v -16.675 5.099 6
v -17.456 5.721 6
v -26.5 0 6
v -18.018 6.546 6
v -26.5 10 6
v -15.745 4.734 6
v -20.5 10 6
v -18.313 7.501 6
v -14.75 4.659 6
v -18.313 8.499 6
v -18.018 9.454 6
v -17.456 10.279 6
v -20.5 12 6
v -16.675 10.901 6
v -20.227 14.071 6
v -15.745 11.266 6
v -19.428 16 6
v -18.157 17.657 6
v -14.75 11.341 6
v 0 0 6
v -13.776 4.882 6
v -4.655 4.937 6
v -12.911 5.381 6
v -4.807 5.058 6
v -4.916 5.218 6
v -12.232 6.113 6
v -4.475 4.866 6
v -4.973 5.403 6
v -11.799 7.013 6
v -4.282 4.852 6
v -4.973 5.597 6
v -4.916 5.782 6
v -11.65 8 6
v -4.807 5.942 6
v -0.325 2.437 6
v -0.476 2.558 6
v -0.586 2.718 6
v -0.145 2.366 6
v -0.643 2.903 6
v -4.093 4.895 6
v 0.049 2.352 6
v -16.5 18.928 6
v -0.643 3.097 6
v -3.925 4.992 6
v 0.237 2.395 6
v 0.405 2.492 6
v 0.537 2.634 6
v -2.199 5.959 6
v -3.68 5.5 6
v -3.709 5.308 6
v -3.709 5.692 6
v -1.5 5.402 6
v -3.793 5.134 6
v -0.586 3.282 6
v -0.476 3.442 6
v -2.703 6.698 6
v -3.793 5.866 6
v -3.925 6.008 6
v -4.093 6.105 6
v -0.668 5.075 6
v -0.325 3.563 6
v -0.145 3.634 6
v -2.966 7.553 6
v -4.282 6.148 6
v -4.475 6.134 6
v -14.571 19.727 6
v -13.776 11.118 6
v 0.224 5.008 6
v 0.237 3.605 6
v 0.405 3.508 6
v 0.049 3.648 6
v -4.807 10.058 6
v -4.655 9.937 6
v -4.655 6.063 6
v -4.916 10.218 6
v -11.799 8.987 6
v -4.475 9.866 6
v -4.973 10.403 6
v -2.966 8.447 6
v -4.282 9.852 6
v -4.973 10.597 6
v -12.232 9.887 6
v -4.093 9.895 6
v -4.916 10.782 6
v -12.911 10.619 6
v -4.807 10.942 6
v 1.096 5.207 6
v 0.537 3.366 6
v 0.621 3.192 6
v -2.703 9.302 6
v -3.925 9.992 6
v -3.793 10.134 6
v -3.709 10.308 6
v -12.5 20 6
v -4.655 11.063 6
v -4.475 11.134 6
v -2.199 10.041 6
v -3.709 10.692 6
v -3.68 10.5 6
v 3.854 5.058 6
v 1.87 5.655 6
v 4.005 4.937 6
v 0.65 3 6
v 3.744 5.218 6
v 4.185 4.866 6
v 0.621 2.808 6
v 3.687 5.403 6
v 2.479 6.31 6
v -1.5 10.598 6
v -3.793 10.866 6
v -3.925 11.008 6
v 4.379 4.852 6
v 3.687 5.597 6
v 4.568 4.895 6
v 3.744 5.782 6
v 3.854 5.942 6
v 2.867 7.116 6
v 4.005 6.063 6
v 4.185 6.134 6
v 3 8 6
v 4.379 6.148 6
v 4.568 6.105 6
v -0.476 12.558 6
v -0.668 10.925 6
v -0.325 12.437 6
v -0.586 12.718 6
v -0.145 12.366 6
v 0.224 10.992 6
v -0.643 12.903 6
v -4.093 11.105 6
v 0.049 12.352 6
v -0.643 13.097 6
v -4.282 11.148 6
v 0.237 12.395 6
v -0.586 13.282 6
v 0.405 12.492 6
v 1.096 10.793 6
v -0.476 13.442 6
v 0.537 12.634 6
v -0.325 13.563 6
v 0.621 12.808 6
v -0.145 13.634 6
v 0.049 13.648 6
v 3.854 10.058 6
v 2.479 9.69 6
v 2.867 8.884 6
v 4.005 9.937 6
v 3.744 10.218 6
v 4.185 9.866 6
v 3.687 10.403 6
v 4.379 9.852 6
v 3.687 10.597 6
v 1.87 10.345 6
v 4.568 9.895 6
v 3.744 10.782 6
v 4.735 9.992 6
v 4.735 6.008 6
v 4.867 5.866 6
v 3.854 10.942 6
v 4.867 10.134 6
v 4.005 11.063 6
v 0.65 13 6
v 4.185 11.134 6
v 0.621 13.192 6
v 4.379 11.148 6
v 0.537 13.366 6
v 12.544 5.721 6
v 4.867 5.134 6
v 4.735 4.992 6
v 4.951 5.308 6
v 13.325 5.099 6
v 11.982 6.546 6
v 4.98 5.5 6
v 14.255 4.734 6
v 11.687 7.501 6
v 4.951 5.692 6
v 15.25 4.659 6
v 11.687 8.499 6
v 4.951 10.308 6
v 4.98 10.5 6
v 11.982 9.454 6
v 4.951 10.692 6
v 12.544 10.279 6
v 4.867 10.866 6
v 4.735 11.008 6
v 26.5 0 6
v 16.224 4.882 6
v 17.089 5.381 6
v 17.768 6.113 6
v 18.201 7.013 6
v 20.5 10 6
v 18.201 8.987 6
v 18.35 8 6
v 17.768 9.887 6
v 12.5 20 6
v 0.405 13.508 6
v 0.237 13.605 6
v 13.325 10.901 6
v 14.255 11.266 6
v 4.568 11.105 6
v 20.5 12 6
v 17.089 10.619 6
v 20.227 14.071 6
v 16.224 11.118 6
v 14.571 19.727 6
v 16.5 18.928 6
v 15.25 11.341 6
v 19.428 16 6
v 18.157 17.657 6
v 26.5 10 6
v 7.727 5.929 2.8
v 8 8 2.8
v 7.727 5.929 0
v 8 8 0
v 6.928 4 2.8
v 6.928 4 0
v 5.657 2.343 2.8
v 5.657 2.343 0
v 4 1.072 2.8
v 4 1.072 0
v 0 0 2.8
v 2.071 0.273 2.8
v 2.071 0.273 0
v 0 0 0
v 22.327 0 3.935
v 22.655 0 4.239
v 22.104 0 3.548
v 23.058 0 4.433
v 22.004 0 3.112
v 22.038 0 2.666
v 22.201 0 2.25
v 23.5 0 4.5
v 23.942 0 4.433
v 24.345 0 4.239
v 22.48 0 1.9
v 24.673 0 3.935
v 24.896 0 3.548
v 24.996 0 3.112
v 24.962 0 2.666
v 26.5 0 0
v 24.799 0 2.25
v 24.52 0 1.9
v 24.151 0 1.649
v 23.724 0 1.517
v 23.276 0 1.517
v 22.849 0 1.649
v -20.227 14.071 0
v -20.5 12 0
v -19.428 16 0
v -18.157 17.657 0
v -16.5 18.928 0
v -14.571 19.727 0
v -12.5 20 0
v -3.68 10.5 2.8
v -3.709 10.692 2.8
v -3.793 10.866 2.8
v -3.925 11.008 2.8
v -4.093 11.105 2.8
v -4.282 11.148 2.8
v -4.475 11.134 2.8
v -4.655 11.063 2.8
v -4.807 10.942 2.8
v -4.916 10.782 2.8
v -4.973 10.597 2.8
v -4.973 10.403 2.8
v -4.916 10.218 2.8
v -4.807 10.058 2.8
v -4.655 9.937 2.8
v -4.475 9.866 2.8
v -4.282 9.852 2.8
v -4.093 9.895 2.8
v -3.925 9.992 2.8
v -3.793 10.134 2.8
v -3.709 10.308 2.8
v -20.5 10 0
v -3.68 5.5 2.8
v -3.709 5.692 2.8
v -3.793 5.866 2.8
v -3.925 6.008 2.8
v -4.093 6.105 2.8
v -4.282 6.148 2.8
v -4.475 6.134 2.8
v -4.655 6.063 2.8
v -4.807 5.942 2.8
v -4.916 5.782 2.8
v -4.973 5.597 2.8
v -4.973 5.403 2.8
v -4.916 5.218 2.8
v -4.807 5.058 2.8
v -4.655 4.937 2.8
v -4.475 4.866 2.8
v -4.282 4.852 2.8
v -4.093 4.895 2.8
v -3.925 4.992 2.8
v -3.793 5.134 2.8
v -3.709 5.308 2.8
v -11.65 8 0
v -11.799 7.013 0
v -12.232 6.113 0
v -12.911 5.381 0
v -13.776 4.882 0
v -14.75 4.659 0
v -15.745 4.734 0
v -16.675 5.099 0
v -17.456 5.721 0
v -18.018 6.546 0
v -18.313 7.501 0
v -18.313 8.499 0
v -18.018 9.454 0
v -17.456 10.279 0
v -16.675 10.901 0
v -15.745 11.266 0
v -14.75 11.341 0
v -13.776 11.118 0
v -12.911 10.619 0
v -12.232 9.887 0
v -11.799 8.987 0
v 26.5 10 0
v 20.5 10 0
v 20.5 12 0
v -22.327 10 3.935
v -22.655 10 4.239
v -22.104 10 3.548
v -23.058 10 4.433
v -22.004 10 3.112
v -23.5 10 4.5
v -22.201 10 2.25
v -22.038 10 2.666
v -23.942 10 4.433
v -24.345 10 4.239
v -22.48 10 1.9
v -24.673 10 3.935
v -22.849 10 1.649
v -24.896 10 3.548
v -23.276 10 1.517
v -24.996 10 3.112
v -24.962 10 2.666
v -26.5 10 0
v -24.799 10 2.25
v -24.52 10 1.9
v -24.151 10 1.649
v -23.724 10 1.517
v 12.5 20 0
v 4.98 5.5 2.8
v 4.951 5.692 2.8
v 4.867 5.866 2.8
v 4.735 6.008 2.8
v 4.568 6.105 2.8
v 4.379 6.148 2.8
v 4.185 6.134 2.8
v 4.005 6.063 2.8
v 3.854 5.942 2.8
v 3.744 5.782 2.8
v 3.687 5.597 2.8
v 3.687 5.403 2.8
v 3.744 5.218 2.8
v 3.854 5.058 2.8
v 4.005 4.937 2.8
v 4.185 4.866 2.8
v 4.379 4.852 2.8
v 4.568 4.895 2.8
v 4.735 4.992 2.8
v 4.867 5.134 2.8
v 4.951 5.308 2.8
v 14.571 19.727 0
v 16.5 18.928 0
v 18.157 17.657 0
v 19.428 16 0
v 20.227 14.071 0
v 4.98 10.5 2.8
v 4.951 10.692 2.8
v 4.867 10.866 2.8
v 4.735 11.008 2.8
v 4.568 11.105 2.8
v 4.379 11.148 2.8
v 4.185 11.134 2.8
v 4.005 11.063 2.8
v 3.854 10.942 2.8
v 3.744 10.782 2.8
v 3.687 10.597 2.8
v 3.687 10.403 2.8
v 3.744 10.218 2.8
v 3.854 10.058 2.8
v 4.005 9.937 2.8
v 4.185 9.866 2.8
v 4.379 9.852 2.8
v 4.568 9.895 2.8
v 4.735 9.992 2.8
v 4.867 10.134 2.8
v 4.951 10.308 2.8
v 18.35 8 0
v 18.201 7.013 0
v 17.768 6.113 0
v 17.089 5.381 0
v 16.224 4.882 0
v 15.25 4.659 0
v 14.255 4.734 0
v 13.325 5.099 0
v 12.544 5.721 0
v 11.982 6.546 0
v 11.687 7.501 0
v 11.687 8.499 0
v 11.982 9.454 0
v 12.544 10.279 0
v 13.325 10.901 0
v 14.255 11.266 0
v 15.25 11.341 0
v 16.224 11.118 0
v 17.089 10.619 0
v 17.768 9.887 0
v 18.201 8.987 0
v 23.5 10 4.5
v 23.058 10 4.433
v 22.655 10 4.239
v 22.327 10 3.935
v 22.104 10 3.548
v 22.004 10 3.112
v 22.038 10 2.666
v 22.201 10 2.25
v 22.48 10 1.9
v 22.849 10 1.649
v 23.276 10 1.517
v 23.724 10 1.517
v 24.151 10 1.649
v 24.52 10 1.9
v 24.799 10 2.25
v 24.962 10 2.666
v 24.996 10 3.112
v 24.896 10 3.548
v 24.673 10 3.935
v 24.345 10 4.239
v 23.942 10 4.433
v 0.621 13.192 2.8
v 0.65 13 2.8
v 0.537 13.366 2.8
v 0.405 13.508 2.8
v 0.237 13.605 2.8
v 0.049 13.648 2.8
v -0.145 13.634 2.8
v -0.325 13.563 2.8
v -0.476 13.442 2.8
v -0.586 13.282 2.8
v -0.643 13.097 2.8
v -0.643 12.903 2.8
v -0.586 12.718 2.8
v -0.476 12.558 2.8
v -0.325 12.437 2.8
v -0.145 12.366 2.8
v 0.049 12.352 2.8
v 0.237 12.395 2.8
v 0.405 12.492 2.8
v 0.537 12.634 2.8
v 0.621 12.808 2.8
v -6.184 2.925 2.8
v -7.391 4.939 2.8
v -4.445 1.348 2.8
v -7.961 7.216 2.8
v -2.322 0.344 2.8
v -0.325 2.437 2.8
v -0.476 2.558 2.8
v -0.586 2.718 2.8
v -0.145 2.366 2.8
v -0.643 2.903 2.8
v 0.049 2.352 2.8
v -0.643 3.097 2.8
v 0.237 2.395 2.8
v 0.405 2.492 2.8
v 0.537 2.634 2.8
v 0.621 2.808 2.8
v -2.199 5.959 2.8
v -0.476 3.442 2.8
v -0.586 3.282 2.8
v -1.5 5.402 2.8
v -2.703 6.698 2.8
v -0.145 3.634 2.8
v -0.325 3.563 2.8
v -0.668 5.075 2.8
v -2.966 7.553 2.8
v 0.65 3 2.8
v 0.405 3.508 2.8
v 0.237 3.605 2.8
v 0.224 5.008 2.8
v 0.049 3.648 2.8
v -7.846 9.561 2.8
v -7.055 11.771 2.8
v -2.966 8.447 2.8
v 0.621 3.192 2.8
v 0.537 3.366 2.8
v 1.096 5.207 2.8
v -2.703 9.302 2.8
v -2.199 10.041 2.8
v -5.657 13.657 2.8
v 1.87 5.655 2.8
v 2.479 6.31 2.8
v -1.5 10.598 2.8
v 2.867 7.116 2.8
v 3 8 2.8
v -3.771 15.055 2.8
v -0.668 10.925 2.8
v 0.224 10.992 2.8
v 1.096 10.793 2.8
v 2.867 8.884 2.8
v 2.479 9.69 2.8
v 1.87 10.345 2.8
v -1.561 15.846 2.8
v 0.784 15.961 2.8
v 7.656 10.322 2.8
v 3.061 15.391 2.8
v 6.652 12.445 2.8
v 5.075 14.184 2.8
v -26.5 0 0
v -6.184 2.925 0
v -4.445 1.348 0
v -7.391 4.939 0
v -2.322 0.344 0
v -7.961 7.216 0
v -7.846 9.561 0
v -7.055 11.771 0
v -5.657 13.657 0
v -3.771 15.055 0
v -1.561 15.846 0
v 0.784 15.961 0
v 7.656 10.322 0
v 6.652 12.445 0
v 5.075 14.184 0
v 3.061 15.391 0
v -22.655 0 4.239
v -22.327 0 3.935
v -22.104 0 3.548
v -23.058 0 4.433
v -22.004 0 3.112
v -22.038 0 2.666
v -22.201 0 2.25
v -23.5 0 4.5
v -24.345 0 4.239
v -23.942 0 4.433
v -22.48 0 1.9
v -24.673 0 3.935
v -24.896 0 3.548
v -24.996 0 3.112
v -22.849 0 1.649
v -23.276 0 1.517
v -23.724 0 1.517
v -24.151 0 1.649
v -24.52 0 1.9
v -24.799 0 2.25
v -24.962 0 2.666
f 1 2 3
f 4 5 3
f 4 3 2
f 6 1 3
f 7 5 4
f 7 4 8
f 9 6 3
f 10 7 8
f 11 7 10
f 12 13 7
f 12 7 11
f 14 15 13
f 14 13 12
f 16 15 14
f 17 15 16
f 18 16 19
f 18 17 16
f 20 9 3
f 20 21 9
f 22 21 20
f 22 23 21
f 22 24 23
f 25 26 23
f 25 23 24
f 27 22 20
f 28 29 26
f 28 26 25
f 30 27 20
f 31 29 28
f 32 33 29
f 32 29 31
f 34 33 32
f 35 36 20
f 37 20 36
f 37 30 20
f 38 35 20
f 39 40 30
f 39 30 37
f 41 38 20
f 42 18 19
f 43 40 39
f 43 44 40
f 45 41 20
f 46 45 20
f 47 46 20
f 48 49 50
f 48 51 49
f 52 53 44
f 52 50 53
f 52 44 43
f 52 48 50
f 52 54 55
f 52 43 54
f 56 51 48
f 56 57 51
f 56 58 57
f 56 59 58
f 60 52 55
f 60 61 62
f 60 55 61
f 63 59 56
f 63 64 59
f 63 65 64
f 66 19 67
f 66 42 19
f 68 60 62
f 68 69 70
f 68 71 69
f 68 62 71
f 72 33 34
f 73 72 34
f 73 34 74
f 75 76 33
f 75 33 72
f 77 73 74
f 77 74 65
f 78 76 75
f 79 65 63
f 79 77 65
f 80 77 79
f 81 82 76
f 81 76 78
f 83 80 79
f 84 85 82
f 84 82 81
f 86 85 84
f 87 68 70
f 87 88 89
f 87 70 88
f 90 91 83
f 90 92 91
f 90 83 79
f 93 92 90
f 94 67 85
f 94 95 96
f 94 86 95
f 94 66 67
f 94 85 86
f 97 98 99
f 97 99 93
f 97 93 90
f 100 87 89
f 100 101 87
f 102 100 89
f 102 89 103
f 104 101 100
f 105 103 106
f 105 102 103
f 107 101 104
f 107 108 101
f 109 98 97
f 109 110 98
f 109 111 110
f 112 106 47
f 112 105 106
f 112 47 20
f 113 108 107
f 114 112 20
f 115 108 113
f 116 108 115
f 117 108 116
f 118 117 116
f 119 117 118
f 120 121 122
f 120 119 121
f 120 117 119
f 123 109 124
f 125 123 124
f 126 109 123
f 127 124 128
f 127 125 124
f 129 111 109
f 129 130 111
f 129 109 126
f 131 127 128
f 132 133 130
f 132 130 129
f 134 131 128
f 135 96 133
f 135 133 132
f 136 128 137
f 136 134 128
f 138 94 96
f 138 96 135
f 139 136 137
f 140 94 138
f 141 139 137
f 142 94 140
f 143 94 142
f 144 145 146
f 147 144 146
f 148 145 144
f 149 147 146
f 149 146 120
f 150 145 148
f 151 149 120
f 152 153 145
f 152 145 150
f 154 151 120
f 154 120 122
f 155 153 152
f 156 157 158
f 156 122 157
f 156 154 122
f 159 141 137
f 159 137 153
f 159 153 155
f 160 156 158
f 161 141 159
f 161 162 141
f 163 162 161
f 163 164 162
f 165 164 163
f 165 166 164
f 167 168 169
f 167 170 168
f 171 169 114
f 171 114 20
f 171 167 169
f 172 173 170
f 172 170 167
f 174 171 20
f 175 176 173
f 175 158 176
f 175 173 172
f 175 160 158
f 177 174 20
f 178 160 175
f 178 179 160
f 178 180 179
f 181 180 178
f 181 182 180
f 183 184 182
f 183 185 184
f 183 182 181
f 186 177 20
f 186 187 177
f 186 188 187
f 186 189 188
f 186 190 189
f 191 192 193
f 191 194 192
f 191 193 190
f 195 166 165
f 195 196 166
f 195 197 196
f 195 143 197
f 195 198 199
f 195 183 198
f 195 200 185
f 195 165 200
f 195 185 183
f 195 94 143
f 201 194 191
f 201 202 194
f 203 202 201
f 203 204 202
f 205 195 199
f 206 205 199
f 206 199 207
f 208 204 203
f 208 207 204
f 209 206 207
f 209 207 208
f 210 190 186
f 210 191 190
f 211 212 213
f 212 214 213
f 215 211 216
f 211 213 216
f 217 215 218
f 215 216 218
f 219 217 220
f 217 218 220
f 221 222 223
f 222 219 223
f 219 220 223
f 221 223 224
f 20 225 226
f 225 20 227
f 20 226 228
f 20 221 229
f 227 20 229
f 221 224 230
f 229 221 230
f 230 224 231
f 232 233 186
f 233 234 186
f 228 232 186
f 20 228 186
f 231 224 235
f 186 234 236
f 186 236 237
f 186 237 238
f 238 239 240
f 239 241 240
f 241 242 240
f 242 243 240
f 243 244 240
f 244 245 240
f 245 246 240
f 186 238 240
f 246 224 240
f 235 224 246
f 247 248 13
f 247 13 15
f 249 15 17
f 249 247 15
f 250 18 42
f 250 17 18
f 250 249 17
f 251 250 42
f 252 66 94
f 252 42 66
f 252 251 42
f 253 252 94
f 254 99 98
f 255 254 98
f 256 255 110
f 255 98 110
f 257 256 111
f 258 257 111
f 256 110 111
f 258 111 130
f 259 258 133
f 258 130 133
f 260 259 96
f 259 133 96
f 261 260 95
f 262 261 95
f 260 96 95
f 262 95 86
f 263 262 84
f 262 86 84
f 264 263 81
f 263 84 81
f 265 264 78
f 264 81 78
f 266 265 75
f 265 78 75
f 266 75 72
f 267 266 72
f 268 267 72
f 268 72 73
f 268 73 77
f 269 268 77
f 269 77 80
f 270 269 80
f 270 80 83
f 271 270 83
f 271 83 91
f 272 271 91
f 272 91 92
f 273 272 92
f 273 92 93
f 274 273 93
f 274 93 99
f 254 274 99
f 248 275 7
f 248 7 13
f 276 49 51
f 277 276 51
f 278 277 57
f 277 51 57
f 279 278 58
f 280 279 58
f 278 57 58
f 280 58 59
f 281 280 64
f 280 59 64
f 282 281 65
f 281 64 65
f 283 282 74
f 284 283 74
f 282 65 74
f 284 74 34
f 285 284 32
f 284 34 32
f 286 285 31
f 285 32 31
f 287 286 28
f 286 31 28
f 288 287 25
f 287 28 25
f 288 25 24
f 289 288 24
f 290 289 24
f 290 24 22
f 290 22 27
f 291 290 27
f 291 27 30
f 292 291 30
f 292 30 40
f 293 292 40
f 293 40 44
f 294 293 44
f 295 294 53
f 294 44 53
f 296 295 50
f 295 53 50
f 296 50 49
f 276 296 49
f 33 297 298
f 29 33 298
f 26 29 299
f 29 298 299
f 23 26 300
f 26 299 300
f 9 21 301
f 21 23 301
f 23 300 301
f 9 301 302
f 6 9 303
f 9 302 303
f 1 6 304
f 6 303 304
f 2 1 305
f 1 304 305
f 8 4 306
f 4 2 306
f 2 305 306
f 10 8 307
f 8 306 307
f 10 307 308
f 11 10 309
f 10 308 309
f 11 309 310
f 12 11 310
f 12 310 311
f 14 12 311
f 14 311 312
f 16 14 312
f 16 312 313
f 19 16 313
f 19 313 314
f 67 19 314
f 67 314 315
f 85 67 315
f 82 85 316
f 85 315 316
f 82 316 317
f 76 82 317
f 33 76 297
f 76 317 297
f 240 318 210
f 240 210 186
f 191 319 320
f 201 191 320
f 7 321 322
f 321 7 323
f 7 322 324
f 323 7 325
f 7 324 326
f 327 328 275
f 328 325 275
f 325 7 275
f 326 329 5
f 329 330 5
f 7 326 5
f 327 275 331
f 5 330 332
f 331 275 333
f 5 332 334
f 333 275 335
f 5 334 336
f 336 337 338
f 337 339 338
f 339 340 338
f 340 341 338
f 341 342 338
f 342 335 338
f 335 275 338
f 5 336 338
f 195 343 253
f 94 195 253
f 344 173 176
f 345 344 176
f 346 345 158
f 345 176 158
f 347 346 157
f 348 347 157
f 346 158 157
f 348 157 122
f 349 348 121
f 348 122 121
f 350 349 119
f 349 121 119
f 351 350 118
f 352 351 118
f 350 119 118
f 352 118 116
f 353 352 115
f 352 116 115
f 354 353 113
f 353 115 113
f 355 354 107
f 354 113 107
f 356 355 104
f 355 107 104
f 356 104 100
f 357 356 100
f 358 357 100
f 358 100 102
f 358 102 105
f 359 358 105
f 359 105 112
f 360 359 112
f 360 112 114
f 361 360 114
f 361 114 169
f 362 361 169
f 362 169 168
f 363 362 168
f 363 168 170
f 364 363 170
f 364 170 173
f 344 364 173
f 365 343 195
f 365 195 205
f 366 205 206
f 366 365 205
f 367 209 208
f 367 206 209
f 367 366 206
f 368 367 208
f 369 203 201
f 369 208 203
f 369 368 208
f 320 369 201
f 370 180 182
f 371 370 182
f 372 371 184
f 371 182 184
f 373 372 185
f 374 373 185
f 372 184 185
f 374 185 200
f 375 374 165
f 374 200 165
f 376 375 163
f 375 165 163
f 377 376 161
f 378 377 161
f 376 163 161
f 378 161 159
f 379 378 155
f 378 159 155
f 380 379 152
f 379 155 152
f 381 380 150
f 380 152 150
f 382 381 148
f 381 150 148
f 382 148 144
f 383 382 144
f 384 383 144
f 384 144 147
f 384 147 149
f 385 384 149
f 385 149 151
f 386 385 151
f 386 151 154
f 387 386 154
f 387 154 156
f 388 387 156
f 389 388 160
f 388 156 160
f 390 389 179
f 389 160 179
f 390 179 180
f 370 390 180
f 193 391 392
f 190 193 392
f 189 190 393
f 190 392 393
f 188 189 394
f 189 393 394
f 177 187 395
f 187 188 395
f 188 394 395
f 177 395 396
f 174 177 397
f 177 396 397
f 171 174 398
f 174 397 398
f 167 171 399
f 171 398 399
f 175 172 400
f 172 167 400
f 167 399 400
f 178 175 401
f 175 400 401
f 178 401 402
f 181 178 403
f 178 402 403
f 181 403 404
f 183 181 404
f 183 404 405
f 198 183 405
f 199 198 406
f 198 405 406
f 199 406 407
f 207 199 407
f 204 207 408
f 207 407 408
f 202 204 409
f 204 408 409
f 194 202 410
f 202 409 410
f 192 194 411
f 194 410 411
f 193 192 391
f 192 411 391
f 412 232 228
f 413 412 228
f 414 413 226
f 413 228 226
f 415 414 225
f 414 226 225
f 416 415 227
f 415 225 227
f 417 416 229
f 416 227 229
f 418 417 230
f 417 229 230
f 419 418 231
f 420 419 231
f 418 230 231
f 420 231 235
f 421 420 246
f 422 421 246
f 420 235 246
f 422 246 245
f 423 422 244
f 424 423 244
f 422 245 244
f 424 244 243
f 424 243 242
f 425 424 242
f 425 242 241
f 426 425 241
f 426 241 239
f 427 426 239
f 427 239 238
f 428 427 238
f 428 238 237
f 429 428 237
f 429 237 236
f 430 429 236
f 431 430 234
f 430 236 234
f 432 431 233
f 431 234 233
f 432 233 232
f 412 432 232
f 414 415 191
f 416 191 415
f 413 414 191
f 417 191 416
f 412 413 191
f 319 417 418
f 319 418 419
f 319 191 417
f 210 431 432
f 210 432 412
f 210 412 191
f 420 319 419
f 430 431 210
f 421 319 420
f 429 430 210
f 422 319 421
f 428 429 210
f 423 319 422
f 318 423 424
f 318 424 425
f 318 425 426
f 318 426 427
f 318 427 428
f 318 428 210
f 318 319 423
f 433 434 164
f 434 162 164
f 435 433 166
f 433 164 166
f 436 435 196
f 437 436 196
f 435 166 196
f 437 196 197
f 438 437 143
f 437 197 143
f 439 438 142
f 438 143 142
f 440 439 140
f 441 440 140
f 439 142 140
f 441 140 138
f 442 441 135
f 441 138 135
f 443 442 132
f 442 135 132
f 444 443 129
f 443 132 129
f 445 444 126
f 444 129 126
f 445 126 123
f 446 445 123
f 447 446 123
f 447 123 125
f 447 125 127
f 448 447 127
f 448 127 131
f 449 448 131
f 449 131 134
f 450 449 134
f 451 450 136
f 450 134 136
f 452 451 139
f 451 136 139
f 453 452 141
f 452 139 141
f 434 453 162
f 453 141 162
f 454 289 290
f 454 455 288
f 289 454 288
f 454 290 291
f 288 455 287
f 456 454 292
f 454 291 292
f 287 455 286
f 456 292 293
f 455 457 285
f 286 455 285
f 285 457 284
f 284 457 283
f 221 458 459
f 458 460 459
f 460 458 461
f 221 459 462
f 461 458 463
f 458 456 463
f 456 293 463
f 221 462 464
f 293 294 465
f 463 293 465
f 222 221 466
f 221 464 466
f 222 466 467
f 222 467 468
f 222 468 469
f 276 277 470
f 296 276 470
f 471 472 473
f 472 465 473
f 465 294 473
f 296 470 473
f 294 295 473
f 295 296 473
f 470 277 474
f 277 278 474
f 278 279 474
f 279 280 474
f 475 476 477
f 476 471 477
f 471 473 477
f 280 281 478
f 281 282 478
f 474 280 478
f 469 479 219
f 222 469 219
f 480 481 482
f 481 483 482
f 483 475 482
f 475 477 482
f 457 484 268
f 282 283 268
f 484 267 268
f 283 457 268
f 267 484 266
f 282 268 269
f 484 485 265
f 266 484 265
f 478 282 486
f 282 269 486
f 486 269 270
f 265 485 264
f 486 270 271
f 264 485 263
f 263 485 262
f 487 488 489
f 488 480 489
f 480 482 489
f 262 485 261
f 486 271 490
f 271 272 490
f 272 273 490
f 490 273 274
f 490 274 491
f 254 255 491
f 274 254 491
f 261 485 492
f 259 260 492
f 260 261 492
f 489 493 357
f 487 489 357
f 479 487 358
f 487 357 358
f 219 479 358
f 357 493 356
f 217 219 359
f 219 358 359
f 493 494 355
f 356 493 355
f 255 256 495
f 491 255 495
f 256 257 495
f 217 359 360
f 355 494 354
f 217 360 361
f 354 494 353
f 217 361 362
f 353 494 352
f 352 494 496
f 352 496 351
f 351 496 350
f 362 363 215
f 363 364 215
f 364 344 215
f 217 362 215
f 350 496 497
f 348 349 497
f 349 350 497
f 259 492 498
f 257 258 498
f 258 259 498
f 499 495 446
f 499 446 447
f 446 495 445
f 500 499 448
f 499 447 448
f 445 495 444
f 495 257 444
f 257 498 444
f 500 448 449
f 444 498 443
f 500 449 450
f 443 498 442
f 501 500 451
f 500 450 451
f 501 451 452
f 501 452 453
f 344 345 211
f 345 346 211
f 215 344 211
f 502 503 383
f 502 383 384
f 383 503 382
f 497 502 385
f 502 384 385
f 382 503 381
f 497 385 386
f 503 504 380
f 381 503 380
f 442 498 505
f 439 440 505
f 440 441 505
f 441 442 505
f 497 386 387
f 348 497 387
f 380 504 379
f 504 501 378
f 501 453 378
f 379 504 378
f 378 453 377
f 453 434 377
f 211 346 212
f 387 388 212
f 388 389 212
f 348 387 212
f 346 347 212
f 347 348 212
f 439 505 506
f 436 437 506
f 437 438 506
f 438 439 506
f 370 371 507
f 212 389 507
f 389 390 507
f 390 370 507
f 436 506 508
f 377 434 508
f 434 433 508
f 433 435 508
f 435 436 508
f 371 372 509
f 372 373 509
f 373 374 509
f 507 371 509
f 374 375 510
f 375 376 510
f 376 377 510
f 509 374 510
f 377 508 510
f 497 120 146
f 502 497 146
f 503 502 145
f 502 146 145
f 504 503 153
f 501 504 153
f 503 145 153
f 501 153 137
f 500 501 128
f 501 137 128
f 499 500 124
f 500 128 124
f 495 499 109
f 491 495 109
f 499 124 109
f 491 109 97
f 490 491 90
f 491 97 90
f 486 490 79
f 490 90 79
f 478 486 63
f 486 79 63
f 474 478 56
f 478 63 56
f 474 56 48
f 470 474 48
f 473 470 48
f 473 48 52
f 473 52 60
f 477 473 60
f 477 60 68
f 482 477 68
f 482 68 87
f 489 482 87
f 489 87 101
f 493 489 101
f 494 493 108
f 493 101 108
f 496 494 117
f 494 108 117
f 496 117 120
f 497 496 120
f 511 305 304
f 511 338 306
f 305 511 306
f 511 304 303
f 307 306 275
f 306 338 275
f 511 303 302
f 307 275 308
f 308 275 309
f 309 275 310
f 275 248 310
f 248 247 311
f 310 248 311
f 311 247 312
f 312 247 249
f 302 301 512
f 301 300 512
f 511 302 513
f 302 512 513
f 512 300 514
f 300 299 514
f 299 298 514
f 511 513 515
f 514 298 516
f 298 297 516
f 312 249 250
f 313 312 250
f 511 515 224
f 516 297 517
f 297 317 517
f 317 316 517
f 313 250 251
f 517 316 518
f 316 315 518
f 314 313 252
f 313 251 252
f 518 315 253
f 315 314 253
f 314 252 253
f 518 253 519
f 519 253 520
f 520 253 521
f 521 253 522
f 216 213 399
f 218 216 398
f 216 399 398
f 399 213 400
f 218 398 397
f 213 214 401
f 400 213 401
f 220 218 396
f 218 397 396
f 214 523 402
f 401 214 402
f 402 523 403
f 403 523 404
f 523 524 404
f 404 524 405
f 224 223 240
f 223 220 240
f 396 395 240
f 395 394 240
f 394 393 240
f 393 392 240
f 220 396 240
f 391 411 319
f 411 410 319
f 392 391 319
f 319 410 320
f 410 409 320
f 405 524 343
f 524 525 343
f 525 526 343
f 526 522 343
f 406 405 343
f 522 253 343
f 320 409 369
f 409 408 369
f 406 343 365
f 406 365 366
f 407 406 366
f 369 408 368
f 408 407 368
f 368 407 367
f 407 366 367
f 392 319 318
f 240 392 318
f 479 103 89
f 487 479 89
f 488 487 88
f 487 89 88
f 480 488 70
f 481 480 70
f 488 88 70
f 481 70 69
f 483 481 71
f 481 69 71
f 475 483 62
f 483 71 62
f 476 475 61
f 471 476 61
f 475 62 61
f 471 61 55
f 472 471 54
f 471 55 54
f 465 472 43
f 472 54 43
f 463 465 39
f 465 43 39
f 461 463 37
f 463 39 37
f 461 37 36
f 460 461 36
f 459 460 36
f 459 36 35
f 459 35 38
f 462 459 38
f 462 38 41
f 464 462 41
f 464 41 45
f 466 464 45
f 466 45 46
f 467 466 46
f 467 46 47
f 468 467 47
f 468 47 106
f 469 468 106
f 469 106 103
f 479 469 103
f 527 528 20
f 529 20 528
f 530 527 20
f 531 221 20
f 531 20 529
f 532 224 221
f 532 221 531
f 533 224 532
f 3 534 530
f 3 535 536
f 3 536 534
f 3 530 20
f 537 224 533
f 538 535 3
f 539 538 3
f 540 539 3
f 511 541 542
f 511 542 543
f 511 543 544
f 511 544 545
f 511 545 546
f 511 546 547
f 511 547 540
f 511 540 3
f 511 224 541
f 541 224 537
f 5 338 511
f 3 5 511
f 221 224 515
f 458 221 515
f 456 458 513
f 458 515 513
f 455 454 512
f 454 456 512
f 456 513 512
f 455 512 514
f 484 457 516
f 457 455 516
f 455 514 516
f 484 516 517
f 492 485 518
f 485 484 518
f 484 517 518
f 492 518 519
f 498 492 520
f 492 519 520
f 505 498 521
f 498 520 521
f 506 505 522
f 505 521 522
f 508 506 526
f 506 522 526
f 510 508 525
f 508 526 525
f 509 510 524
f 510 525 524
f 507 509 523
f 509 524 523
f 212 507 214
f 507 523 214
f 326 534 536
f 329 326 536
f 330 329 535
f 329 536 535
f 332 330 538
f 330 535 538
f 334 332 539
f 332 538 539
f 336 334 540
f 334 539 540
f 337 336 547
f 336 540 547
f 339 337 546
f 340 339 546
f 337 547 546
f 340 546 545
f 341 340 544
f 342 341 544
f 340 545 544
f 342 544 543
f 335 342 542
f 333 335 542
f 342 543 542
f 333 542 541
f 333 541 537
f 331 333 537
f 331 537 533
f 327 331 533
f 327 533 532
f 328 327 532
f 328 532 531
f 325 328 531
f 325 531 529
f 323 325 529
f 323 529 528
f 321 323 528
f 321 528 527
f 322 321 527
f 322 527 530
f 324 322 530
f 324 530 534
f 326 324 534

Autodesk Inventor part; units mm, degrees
ref_plane "YZ Plane" through (0, 0, 0) normal (1, 0, 0) x (0, 1, 0)
ref_plane "XZ Plane" through (0, 0, 0) normal (0, 1, 0) x (-1, 0, 0)
sketch "Sketch1" plane through (0, 0, 0) normal (0, 0, 1) x (1, 0, 0)
  line L0 (-23.75, 0) -> (0, 0)
  circle A0 centre (0, 8) radius 8
  line L1 (0, 0) -> (23.75, 0)
  line L2 (12.5, 20) -> (-12.5, 20)
  circle A1 centre (15, 8) radius 3.35
  circle A2 centre (-15, 8) radius 3.35
  circle A3 centre (0, 8) radius 3
  line L3 (-23.75, 0) -> (-26.5, 0)
  line L4 (23.75, 0) -> (26.5, 0)
  line L5 (-26.5, 0) -> (-20.5, 0)
  line L6 (-20.5, 10) -> (-26.5, 10)
  line L7 (-26.5, 10) -> (-26.5, 0)
  line L8 (-20.5, 10) -> (-20.5, 12)
  line L9 (26.5, 0) -> (20.5, 0)
  line L10 (20.5, 10) -> (26.5, 10)
  line L11 (26.5, 10) -> (26.5, 0)
  line L12 (20.5, 10) -> (20.5, 12)
  arc A4 (-12.5, 20) -> (-20.5, 12) centre (-12.5, 12) ccw
  arc A5 (20.5, 12) -> (12.5, 20) centre (12.5, 12) ccw
  point P0 (20.5, 20)
  point P1 (-20.5, 20)
  dimension "d0" = 15
  dimension "d1" = 15
  dimension "d8" = 12
  dimension "d9" = 12
  dimension "d10" = 12
  dimension "d11" = 8
  dimension "d17" = 6.7
  dimension "d18" = 6.7
  dimension "d21" = 6
  dimension "d22" = 6
  dimension "d23" = 10
  dimension "d24" = 10
  dimension "d36" = 41
  dimension "d37" = 8
  dimension "d38" = 20
  dimension "d39" = 26.5
  dimension "d40" = 8
ref_plane "Work Plane2" through (-26.5, 15, 0) normal (0, 1, 0) x (1, 0, 0)
sketch "Sketch2" plane through (-26.5, 15, 0) normal (0, 1, 0) x (1, 0, 0)
  line L0 (0, 0) -> (6, 0) projected
  line L1 (0, 0) -> (0, -6) projected
  line L2 (6, -6) -> (0, -6) projected
  line L3 (6, 0) -> (6, -6) projected
  line L4 (47, 0) -> (53, 0) projected
  line L5 (47, 0) -> (47, -6) projected
  line L6 (53, -6) -> (47, -6) projected
  line L7 (53, 0) -> (53, -6) projected
  circle A0 centre (3, -3) radius 1.5
  circle A1 centre (50, -3) radius 1.5
  point P0 (26.5, 0)
  dimension "d27" = 3
  dimension "d28" = 3
extrude "Extrusion3" add sketch "Sketch1" along normal blind 6 contours L3 L7 L6 L8 A4 L2 A5 L12 L10 L11 L4 L1 L0
hole "Hole2" at (-23.5, 15, 3) at (23.5, 15, 3) direction (0, -1, 0) diameter 3 end through all
sketch "Sketch3" plane through (0, 0, 6) normal (0, 0, 1) x (1, 0, 0)
  circle A0 centre (0, 8) radius 8 projected
  circle A1 centre (0, 13) radius 0.65
  circle A2 centre (-4.3301, 10.5) radius 0.65
  circle A3 centre (-4.3301, 5.5) radius 0.65
  circle A4 centre (0, 3) radius 0.65
  circle A5 centre (4.3301, 5.5) radius 0.65
  circle A6 centre (4.3301, 10.5) radius 0.65
  circle A7 centre (0, 8) radius 3
  point P0 (0, 0)
  dimension "d53" = 1.3
  dimension "d56" = 360
  dimension "d60" = 6
extrude "Extrusion6" add sketch "Sketch3" against normal blind 3.2
properties part number "Base_Motor_acrilico_15"
